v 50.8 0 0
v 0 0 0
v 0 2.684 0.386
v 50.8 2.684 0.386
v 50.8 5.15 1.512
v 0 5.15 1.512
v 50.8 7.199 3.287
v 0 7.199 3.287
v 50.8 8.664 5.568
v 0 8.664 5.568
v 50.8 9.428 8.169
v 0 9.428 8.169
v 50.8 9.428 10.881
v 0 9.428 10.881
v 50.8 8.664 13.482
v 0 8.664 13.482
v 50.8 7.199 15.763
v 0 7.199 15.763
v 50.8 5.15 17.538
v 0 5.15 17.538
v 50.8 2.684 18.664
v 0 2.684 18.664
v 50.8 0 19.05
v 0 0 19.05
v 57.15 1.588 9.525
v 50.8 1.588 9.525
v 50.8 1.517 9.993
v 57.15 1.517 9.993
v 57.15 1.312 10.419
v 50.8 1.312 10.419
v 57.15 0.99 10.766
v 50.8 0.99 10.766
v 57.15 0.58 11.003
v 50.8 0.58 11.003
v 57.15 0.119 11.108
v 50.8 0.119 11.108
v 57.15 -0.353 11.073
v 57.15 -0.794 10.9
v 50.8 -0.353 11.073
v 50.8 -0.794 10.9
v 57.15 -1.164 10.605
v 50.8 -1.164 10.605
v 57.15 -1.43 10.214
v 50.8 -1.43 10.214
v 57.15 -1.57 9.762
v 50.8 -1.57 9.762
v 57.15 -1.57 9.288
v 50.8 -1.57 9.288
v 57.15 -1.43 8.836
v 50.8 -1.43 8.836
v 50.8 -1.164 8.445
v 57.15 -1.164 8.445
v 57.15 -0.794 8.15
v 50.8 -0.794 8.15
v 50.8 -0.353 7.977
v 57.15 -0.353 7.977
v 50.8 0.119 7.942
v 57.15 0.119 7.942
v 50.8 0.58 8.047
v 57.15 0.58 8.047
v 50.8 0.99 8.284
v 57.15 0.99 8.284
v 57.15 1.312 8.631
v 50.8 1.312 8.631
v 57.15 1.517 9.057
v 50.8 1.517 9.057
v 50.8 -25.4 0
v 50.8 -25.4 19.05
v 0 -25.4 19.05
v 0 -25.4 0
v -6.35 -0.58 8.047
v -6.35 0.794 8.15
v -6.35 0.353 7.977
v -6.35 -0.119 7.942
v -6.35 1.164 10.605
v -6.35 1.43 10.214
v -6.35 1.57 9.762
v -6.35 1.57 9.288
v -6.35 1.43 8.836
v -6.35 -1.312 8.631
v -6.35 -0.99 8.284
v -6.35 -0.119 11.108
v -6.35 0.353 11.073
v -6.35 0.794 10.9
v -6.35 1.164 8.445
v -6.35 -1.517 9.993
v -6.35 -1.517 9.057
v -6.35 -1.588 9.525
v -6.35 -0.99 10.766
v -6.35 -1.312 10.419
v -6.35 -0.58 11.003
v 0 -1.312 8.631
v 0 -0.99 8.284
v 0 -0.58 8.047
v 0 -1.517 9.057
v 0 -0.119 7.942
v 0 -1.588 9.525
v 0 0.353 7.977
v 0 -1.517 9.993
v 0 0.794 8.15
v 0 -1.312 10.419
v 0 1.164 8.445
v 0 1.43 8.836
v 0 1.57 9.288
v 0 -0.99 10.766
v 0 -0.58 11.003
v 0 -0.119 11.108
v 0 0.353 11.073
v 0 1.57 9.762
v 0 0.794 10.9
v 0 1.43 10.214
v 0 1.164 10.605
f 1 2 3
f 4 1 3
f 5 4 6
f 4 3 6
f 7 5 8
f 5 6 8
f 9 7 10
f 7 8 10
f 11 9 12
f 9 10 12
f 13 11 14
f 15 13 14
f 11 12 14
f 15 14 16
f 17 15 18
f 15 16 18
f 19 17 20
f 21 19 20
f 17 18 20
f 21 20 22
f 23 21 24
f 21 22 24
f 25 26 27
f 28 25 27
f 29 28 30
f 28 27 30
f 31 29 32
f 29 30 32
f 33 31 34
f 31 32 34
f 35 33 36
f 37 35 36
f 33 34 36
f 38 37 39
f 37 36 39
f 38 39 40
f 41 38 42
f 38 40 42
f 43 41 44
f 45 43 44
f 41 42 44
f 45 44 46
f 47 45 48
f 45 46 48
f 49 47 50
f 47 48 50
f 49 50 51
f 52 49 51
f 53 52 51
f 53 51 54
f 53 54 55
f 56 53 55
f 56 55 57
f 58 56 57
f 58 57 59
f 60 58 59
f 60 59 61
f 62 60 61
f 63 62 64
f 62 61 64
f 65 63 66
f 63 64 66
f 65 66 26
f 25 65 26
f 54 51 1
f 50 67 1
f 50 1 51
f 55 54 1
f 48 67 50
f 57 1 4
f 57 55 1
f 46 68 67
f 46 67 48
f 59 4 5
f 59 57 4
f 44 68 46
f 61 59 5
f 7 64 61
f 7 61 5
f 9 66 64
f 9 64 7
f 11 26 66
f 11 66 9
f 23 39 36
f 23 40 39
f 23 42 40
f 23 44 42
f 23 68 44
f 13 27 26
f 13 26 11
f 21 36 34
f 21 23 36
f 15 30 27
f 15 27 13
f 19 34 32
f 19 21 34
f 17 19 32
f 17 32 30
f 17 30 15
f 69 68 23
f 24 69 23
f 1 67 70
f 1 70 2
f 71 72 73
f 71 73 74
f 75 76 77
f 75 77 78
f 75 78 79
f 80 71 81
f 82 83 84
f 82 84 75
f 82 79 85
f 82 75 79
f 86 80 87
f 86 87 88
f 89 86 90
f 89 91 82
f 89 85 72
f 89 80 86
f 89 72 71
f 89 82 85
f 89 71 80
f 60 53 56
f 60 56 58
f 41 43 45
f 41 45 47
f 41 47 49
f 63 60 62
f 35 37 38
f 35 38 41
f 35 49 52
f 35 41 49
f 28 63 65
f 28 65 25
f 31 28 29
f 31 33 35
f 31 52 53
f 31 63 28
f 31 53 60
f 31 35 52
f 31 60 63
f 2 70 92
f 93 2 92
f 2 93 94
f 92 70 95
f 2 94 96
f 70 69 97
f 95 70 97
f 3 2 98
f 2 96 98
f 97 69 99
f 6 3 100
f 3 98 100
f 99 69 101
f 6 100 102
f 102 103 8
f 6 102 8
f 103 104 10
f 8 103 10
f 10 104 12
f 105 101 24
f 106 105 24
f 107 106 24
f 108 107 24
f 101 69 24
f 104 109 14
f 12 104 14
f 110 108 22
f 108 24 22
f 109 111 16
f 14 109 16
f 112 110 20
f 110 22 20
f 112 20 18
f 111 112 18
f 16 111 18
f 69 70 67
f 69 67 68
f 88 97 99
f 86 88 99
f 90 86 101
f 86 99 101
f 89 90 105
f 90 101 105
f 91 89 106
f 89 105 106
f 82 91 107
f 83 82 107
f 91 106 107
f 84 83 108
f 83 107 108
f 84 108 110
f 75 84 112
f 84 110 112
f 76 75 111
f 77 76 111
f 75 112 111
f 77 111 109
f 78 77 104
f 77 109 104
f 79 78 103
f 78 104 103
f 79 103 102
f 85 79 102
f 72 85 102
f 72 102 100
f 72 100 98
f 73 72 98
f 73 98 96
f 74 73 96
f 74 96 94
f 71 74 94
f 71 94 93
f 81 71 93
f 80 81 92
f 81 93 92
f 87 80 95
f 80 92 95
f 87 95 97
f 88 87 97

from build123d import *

# Parameters (mm, degrees)
F0_W     = 25.4
F0_H     = 19.05
F1_DEPTH = 50.8
F2_R     = 1.5875
F4_DEPTH = 6.35
F3_R     = 1.5875
F5_DEPTH = 6.35


with BuildPart() as f1:
    # F0 (on Right) → F1 (new body)
    with BuildSketch(Plane.YZ):
        with Locations((-12.7, 9.525)):
            Rectangle(F0_W, F0_H)
        with BuildLine():
            ThreePointArc((0, 0), (9.525, 9.525), (0, 19.05))
            Line((0, 19.05), (0, 0))
        make_face()
    extrude(amount=F1_DEPTH)

    # F2 (on face) → F4 (join)
    with BuildSketch(Plane.YZ.offset(50.8)):
        with Locations((0, 9.525)):
            Circle(F2_R)
    extrude(amount=F4_DEPTH)

    # F3 (on face) → F5 (join)
    with BuildSketch(Plane(origin=(0, 0, 0), x_dir=(0, -1, 0), z_dir=(-1, 0, 0))):
        with Locations((0, 9.525)):
            Circle(F3_R)
    extrude(amount=F5_DEPTH)


solid = f1.part
